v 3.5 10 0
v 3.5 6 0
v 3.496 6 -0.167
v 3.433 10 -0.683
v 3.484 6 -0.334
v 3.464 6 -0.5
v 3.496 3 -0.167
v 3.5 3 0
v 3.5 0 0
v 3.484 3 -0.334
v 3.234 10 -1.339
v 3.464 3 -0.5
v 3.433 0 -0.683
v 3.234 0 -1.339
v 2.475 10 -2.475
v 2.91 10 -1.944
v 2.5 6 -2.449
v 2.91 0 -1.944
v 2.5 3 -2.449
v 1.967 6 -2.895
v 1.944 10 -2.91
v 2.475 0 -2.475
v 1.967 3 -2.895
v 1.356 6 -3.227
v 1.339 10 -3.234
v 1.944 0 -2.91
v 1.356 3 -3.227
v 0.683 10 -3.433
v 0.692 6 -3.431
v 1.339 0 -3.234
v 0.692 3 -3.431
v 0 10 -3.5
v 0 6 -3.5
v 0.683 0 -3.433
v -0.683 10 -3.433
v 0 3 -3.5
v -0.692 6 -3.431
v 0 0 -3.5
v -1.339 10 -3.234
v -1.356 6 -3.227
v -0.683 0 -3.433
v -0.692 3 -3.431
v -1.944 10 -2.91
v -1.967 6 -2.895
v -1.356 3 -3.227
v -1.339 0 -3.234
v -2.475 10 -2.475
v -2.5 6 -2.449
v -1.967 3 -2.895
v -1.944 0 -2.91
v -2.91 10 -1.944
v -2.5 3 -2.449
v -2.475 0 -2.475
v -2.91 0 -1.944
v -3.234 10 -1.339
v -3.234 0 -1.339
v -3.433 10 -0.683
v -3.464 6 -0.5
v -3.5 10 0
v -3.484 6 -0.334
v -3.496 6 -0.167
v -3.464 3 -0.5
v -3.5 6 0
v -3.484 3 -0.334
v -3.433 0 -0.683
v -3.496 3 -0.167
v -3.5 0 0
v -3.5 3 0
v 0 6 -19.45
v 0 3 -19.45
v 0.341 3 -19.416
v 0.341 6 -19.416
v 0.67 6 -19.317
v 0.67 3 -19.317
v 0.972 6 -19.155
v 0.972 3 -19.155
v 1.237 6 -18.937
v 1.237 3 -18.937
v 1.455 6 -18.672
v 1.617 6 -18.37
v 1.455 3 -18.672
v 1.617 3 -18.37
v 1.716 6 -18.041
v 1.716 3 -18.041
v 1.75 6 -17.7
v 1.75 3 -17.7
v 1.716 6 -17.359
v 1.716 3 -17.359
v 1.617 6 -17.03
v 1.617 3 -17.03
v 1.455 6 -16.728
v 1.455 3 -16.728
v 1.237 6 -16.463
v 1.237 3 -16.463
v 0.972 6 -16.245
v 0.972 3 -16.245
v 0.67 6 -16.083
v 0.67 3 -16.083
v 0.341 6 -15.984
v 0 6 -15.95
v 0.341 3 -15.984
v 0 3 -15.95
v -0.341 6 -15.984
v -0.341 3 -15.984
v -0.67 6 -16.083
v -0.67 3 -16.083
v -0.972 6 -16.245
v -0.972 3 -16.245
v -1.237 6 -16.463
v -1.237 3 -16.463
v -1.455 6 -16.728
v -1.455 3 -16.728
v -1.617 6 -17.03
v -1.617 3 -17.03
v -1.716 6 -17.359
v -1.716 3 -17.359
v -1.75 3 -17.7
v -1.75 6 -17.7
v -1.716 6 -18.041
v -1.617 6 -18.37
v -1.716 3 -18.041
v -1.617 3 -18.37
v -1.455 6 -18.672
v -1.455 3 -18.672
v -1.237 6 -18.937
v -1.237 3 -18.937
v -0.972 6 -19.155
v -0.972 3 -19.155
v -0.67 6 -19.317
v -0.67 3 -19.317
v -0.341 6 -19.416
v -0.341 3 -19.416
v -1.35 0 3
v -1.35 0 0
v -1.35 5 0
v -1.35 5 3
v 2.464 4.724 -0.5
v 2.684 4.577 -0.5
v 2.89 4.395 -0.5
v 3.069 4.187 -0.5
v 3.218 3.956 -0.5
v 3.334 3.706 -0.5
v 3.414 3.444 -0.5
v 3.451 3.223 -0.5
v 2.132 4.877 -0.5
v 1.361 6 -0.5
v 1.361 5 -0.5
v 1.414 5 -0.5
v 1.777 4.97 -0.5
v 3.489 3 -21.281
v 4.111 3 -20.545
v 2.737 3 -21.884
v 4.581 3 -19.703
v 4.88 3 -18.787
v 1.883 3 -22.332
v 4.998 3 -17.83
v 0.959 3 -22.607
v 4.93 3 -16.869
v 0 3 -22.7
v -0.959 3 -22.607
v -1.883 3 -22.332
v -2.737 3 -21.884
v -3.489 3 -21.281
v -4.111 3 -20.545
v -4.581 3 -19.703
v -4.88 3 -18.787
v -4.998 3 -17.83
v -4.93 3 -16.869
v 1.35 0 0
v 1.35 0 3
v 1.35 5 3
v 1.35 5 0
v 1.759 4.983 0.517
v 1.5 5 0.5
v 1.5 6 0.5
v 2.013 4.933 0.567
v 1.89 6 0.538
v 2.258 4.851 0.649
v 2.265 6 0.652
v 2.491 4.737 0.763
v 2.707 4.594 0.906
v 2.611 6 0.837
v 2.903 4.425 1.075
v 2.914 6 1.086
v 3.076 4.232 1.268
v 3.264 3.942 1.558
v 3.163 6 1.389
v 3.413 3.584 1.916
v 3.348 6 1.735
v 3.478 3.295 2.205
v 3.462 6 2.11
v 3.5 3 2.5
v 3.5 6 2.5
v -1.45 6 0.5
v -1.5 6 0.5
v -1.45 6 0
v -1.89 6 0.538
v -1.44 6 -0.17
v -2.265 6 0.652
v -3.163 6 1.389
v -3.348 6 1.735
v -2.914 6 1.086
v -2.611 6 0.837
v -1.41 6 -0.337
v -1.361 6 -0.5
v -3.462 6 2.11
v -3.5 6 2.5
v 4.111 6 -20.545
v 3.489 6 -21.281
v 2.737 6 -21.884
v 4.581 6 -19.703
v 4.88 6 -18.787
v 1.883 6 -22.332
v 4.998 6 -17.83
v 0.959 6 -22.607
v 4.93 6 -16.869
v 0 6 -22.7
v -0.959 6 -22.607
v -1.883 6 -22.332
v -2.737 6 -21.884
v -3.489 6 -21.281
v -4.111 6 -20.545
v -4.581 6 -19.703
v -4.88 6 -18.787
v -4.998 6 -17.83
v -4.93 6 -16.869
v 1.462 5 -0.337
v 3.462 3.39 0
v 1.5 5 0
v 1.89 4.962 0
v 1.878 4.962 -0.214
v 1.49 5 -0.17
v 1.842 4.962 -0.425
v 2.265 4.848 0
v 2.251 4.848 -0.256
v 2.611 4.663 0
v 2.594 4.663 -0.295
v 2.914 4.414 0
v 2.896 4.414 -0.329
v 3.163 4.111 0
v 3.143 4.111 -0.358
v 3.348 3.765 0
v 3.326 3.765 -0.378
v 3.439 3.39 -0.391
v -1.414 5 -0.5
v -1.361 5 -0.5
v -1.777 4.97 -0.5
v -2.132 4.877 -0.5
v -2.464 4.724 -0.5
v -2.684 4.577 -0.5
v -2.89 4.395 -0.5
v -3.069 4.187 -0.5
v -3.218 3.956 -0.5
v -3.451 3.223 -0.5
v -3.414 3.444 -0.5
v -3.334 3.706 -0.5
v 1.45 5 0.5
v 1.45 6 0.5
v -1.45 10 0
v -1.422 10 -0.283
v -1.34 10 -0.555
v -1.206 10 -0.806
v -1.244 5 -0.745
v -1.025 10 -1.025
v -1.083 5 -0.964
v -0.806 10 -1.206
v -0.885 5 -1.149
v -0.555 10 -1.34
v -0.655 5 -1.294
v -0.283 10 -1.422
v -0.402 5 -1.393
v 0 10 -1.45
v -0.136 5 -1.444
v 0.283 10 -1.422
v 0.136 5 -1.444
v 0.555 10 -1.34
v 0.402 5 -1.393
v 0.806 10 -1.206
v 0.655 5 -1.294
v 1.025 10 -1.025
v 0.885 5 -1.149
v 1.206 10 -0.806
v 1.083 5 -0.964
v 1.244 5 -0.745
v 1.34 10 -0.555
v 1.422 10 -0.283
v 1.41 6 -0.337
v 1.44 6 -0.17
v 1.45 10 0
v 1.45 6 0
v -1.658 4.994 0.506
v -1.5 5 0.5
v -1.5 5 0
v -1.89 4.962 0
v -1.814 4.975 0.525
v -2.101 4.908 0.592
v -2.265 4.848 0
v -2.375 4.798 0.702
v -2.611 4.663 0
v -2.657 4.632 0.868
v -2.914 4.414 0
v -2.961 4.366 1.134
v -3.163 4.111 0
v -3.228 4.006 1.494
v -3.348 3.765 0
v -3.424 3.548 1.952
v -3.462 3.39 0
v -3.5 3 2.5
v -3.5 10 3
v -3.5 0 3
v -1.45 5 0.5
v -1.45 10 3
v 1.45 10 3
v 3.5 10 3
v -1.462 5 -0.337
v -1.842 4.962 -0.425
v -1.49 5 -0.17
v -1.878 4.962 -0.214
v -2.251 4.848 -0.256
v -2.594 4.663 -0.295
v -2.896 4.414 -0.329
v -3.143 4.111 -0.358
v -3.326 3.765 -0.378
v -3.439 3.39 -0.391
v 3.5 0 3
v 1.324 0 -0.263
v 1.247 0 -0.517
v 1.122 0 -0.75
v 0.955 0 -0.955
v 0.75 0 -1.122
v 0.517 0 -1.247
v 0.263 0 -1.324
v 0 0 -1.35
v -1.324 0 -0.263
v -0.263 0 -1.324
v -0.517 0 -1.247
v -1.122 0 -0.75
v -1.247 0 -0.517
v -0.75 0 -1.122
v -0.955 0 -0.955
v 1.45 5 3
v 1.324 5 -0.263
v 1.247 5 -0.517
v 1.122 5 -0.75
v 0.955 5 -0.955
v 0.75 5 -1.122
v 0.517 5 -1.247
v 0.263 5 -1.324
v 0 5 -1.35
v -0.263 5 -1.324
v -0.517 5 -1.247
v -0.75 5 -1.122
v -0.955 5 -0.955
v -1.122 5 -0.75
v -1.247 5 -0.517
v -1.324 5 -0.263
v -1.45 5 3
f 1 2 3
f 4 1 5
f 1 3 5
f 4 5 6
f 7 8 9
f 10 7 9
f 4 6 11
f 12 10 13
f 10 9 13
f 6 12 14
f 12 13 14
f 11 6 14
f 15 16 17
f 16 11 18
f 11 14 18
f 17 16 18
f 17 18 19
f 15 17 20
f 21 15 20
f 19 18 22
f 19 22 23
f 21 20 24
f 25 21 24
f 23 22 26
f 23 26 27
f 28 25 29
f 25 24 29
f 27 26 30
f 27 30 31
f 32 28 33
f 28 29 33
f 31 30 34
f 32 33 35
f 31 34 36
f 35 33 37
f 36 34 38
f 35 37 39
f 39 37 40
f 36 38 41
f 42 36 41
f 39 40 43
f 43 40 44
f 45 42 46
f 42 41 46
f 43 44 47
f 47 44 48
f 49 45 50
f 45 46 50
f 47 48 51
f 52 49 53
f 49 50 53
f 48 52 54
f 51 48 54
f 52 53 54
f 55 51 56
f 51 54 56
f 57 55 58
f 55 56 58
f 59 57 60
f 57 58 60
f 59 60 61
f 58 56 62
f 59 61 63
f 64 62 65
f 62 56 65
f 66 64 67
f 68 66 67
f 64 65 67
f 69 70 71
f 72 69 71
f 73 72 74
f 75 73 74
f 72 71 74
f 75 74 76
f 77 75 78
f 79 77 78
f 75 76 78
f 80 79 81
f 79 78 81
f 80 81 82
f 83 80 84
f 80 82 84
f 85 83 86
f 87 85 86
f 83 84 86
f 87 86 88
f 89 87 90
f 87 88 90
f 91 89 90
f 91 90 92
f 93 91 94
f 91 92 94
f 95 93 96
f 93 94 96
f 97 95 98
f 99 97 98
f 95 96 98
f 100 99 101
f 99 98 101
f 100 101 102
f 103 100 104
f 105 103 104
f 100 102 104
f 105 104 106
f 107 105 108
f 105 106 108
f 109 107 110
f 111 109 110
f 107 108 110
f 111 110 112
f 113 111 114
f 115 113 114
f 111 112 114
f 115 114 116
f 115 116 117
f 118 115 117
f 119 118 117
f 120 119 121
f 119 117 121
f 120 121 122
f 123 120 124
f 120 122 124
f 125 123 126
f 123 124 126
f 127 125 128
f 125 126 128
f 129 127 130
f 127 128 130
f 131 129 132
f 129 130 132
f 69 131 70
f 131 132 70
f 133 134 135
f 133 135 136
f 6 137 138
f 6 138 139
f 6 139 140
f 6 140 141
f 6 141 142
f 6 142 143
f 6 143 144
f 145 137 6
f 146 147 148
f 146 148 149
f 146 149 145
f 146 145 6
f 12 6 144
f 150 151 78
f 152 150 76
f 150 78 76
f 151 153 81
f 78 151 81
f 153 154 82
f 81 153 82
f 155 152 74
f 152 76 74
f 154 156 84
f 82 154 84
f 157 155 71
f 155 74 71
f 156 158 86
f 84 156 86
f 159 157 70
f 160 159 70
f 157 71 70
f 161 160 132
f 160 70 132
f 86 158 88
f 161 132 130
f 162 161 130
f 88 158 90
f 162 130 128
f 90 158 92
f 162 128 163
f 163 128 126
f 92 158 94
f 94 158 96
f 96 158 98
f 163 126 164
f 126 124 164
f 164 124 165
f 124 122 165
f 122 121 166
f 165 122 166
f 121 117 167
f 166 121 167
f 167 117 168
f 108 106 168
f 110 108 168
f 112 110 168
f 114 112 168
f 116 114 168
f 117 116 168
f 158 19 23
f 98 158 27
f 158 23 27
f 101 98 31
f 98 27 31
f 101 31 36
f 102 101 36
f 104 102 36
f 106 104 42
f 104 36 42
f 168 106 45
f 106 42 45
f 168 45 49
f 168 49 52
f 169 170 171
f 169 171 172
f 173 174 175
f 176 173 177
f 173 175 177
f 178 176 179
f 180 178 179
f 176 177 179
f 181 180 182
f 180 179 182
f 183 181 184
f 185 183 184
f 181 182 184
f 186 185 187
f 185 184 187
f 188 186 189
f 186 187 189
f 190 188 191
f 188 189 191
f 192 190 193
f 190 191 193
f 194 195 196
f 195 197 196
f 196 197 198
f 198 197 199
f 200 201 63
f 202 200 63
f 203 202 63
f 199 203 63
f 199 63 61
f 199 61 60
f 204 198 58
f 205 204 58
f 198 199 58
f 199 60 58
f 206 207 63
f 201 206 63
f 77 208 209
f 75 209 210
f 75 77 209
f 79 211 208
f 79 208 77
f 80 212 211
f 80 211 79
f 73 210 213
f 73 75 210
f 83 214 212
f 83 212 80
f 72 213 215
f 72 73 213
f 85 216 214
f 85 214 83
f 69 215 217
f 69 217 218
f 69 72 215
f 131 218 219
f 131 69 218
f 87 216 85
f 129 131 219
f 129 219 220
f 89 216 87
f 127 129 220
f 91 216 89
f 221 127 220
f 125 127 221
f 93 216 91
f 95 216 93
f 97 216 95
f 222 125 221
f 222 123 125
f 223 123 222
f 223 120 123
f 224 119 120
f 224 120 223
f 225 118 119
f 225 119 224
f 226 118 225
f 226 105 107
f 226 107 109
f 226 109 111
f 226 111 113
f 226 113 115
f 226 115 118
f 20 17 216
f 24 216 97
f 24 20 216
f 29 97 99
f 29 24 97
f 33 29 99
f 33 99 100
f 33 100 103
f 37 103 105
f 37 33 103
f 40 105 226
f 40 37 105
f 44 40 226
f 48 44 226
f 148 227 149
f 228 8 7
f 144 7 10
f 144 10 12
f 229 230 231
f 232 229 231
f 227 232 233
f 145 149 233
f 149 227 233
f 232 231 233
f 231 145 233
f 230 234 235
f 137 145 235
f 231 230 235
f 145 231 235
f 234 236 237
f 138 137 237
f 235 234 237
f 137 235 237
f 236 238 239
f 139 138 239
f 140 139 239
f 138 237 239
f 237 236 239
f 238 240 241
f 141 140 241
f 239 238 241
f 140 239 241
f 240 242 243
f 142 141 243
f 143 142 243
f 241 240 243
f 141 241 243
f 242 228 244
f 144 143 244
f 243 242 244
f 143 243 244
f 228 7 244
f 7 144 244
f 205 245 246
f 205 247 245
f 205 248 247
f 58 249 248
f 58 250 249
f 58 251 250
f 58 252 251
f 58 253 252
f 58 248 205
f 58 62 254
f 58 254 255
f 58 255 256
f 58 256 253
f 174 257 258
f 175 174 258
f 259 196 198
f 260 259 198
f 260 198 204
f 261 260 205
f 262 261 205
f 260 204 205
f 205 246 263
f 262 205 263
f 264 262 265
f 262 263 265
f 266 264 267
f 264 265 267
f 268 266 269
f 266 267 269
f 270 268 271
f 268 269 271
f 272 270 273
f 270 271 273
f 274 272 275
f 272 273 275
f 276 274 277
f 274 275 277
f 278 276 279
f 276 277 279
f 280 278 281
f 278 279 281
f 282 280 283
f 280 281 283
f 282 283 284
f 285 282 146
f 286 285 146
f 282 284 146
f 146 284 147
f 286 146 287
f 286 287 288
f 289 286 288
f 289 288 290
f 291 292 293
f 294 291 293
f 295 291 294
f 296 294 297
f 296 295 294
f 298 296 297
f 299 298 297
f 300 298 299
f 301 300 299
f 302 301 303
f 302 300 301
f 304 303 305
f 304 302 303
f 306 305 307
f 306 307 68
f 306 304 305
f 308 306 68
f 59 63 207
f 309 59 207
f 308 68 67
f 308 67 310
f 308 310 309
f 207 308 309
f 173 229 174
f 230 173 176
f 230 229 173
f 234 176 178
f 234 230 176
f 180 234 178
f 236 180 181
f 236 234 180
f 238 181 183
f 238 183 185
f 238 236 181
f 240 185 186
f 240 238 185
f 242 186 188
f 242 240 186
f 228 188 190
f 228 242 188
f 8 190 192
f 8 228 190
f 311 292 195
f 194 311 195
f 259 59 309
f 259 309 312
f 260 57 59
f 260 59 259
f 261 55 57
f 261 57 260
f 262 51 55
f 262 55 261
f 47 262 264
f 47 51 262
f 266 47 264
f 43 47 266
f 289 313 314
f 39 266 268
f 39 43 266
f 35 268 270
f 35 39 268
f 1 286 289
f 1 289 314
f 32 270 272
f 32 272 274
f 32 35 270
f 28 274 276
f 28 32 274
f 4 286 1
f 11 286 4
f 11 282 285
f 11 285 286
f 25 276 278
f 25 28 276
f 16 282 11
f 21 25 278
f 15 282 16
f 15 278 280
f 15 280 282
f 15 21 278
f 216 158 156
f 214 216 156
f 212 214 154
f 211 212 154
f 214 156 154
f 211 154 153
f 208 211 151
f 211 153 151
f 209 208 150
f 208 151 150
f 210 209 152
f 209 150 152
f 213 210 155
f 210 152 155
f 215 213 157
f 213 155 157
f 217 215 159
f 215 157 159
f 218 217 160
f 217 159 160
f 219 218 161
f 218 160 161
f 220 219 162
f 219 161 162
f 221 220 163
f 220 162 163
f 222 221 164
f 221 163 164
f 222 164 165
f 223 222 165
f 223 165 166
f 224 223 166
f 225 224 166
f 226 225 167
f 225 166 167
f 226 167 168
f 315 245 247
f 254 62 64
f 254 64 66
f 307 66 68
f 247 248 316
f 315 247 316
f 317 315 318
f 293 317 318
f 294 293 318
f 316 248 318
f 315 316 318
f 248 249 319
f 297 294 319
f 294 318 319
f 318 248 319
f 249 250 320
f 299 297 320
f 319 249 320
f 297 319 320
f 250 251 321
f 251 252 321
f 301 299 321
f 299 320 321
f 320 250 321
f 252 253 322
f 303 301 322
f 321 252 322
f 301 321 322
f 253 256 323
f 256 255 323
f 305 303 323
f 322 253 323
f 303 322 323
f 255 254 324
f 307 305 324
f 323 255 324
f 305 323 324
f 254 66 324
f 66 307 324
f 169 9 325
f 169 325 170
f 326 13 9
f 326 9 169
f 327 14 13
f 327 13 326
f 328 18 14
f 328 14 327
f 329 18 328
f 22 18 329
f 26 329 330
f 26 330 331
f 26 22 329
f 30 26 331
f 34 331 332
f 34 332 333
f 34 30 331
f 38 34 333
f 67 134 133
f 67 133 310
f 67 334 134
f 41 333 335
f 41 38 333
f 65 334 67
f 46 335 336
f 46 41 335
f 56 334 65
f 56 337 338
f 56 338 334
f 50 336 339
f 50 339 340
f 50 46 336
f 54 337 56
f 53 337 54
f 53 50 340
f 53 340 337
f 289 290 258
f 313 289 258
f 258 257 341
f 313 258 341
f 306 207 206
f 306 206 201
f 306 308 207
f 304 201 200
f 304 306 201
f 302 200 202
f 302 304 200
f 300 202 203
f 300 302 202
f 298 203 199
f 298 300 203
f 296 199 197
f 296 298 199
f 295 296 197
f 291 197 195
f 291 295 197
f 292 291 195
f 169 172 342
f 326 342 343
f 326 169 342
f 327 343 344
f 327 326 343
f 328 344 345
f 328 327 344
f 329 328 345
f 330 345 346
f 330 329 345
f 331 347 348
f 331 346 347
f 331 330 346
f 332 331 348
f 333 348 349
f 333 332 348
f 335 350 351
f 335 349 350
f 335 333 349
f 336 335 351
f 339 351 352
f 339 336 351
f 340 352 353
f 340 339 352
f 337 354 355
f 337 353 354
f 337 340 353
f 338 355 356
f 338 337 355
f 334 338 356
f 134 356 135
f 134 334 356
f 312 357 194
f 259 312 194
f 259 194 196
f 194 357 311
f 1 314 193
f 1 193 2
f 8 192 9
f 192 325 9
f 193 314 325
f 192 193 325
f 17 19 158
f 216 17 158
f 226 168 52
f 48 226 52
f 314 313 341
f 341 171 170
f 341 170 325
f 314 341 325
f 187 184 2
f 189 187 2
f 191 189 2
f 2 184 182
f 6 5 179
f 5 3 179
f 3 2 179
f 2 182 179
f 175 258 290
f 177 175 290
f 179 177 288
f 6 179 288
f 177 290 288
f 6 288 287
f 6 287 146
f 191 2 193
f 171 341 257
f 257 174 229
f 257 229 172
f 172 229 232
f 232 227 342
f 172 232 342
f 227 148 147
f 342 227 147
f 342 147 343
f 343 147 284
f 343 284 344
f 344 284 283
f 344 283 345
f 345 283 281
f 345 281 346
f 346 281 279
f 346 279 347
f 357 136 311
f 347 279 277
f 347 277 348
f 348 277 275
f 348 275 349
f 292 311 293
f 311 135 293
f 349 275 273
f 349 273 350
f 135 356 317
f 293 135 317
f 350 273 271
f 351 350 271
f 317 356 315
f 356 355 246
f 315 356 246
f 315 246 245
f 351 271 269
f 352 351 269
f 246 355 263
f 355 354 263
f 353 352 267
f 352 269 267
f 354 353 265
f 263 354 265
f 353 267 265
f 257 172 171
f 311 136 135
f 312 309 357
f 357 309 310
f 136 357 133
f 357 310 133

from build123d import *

# Parameters (mm, degrees)
BOSS_EXTRUDE1_DEPTH     = 5
BOSS_EXTRUDE2_DEPTH     = 5
CUT_EXTRUDE1_DEPTH      = 12.694122455
CUT_EXTRUDE1_DEPTH_BACK = 12.694122455
SKETCH3_W               = 1
SKETCH3_H               = 1
FILLET1_R               = 2
BOSS_EXTRUDE3_START     = 3
SKETCH4_R               = 1.75
BOSS_EXTRUDE3_DEPTH     = 3


with BuildPart() as part:
    # Sketch1 → Boss-Extrude1 (new body)
    with BuildSketch(Plane(origin=(0, 0, 0), x_dir=(1, 0, 0), z_dir=(0, 1, 0))):
        with BuildLine():
            Line((-1.35, 0), (-1.35, -3))
            Line((-1.35, -3), (-3.5, -3))
            Line((-3.5, -3), (-3.5, 0))
            ThreePointArc((-3.5, 0), (0, 3.5), (3.5, 0))
            Line((3.5, 0), (3.5, -3))
            Line((3.5, -3), (1.35, -3))
            Line((1.35, -3), (1.35, 0))
            ThreePointArc((1.35, 0), (0, 1.35), (-1.35, 0))
        make_face()
    extrude(amount=BOSS_EXTRUDE1_DEPTH)

    # Sketch2 → Boss-Extrude2 (add)
    with BuildSketch(Plane(origin=(0, 5, 0), x_dir=(1, 0, 0), z_dir=(0, 1, 0))):
        with BuildLine():
            Line((-1.45, -2.9), (-1.45, 0))
            ThreePointArc((-1.45, 0), (0, 1.45), (1.45, 0))
            Line((1.45, 0), (1.45, -2.9))
            Line((1.45, -2.9), (1.45, -3))
            Line((1.45, -3), (3.5, -3))
            Line((3.5, -3), (3.5, 0))
            ThreePointArc((3.5, 0), (0, 3.5), (-3.5, 0))
            Line((-3.5, 0), (-3.5, -3))
            Line((-3.5, -3), (-1.45, -3))
            Line((-1.45, -3), (-1.45, -2.9))
        make_face()
    extrude(amount=BOSS_EXTRUDE2_DEPTH)

    # Sketch3 → Cut-Extrude1 (cut, two sides: drawn at the far end of the back side and taken through both)
    with BuildSketch(Plane(origin=(-1.45, 0, 0), x_dir=(0, 0, -1), z_dir=(1, 0, 0)).offset(-CUT_EXTRUDE1_DEPTH_BACK)):
        with Locations((0, 5.5)):
            Rectangle(SKETCH3_W, SKETCH3_H)
    extrude(amount=CUT_EXTRUDE1_DEPTH + CUT_EXTRUDE1_DEPTH_BACK, mode=Mode.SUBTRACT)

    # Fillet1
    fillet1_edges = [part.edges().sort_by_distance(p)[0] for p in [
        (3.5, 5.5, 0.5),
        (3.5, 5, 0.25),
        (-3.5, 5.5, 0.5),
        (3.491013868, 5, -0.250643519),
        (-3.5, 5, 0.25),
        (-3.491013868, 5, -0.250643519),
    ]]
    fillet(fillet1_edges, radius=FILLET1_R)

    # Sketch4 → Boss-Extrude3 (add)
    with BuildSketch(Plane.XZ.offset(-6).offset(BOSS_EXTRUDE3_START)):
        with BuildLine():
            Line((-4.930452649, -16.86895447), (-2.5, -2.449489743))
            ThreePointArc((-2.5, -2.449489743), (0, -3.5), (2.5, -2.449489743))
            Line((2.5, -2.449489743), (4.930452649, -16.86895447))
            ThreePointArc((4.930452649, -16.86895447), (0, -22.7), (-4.930452649, -16.86895447))
        make_face()
        with Locations(Location((0, -17.7, 0), (0, 0, 270))):
            Circle(SKETCH4_R, mode=Mode.SUBTRACT)
    extrude(amount=-BOSS_EXTRUDE3_DEPTH)


solid = part.part
